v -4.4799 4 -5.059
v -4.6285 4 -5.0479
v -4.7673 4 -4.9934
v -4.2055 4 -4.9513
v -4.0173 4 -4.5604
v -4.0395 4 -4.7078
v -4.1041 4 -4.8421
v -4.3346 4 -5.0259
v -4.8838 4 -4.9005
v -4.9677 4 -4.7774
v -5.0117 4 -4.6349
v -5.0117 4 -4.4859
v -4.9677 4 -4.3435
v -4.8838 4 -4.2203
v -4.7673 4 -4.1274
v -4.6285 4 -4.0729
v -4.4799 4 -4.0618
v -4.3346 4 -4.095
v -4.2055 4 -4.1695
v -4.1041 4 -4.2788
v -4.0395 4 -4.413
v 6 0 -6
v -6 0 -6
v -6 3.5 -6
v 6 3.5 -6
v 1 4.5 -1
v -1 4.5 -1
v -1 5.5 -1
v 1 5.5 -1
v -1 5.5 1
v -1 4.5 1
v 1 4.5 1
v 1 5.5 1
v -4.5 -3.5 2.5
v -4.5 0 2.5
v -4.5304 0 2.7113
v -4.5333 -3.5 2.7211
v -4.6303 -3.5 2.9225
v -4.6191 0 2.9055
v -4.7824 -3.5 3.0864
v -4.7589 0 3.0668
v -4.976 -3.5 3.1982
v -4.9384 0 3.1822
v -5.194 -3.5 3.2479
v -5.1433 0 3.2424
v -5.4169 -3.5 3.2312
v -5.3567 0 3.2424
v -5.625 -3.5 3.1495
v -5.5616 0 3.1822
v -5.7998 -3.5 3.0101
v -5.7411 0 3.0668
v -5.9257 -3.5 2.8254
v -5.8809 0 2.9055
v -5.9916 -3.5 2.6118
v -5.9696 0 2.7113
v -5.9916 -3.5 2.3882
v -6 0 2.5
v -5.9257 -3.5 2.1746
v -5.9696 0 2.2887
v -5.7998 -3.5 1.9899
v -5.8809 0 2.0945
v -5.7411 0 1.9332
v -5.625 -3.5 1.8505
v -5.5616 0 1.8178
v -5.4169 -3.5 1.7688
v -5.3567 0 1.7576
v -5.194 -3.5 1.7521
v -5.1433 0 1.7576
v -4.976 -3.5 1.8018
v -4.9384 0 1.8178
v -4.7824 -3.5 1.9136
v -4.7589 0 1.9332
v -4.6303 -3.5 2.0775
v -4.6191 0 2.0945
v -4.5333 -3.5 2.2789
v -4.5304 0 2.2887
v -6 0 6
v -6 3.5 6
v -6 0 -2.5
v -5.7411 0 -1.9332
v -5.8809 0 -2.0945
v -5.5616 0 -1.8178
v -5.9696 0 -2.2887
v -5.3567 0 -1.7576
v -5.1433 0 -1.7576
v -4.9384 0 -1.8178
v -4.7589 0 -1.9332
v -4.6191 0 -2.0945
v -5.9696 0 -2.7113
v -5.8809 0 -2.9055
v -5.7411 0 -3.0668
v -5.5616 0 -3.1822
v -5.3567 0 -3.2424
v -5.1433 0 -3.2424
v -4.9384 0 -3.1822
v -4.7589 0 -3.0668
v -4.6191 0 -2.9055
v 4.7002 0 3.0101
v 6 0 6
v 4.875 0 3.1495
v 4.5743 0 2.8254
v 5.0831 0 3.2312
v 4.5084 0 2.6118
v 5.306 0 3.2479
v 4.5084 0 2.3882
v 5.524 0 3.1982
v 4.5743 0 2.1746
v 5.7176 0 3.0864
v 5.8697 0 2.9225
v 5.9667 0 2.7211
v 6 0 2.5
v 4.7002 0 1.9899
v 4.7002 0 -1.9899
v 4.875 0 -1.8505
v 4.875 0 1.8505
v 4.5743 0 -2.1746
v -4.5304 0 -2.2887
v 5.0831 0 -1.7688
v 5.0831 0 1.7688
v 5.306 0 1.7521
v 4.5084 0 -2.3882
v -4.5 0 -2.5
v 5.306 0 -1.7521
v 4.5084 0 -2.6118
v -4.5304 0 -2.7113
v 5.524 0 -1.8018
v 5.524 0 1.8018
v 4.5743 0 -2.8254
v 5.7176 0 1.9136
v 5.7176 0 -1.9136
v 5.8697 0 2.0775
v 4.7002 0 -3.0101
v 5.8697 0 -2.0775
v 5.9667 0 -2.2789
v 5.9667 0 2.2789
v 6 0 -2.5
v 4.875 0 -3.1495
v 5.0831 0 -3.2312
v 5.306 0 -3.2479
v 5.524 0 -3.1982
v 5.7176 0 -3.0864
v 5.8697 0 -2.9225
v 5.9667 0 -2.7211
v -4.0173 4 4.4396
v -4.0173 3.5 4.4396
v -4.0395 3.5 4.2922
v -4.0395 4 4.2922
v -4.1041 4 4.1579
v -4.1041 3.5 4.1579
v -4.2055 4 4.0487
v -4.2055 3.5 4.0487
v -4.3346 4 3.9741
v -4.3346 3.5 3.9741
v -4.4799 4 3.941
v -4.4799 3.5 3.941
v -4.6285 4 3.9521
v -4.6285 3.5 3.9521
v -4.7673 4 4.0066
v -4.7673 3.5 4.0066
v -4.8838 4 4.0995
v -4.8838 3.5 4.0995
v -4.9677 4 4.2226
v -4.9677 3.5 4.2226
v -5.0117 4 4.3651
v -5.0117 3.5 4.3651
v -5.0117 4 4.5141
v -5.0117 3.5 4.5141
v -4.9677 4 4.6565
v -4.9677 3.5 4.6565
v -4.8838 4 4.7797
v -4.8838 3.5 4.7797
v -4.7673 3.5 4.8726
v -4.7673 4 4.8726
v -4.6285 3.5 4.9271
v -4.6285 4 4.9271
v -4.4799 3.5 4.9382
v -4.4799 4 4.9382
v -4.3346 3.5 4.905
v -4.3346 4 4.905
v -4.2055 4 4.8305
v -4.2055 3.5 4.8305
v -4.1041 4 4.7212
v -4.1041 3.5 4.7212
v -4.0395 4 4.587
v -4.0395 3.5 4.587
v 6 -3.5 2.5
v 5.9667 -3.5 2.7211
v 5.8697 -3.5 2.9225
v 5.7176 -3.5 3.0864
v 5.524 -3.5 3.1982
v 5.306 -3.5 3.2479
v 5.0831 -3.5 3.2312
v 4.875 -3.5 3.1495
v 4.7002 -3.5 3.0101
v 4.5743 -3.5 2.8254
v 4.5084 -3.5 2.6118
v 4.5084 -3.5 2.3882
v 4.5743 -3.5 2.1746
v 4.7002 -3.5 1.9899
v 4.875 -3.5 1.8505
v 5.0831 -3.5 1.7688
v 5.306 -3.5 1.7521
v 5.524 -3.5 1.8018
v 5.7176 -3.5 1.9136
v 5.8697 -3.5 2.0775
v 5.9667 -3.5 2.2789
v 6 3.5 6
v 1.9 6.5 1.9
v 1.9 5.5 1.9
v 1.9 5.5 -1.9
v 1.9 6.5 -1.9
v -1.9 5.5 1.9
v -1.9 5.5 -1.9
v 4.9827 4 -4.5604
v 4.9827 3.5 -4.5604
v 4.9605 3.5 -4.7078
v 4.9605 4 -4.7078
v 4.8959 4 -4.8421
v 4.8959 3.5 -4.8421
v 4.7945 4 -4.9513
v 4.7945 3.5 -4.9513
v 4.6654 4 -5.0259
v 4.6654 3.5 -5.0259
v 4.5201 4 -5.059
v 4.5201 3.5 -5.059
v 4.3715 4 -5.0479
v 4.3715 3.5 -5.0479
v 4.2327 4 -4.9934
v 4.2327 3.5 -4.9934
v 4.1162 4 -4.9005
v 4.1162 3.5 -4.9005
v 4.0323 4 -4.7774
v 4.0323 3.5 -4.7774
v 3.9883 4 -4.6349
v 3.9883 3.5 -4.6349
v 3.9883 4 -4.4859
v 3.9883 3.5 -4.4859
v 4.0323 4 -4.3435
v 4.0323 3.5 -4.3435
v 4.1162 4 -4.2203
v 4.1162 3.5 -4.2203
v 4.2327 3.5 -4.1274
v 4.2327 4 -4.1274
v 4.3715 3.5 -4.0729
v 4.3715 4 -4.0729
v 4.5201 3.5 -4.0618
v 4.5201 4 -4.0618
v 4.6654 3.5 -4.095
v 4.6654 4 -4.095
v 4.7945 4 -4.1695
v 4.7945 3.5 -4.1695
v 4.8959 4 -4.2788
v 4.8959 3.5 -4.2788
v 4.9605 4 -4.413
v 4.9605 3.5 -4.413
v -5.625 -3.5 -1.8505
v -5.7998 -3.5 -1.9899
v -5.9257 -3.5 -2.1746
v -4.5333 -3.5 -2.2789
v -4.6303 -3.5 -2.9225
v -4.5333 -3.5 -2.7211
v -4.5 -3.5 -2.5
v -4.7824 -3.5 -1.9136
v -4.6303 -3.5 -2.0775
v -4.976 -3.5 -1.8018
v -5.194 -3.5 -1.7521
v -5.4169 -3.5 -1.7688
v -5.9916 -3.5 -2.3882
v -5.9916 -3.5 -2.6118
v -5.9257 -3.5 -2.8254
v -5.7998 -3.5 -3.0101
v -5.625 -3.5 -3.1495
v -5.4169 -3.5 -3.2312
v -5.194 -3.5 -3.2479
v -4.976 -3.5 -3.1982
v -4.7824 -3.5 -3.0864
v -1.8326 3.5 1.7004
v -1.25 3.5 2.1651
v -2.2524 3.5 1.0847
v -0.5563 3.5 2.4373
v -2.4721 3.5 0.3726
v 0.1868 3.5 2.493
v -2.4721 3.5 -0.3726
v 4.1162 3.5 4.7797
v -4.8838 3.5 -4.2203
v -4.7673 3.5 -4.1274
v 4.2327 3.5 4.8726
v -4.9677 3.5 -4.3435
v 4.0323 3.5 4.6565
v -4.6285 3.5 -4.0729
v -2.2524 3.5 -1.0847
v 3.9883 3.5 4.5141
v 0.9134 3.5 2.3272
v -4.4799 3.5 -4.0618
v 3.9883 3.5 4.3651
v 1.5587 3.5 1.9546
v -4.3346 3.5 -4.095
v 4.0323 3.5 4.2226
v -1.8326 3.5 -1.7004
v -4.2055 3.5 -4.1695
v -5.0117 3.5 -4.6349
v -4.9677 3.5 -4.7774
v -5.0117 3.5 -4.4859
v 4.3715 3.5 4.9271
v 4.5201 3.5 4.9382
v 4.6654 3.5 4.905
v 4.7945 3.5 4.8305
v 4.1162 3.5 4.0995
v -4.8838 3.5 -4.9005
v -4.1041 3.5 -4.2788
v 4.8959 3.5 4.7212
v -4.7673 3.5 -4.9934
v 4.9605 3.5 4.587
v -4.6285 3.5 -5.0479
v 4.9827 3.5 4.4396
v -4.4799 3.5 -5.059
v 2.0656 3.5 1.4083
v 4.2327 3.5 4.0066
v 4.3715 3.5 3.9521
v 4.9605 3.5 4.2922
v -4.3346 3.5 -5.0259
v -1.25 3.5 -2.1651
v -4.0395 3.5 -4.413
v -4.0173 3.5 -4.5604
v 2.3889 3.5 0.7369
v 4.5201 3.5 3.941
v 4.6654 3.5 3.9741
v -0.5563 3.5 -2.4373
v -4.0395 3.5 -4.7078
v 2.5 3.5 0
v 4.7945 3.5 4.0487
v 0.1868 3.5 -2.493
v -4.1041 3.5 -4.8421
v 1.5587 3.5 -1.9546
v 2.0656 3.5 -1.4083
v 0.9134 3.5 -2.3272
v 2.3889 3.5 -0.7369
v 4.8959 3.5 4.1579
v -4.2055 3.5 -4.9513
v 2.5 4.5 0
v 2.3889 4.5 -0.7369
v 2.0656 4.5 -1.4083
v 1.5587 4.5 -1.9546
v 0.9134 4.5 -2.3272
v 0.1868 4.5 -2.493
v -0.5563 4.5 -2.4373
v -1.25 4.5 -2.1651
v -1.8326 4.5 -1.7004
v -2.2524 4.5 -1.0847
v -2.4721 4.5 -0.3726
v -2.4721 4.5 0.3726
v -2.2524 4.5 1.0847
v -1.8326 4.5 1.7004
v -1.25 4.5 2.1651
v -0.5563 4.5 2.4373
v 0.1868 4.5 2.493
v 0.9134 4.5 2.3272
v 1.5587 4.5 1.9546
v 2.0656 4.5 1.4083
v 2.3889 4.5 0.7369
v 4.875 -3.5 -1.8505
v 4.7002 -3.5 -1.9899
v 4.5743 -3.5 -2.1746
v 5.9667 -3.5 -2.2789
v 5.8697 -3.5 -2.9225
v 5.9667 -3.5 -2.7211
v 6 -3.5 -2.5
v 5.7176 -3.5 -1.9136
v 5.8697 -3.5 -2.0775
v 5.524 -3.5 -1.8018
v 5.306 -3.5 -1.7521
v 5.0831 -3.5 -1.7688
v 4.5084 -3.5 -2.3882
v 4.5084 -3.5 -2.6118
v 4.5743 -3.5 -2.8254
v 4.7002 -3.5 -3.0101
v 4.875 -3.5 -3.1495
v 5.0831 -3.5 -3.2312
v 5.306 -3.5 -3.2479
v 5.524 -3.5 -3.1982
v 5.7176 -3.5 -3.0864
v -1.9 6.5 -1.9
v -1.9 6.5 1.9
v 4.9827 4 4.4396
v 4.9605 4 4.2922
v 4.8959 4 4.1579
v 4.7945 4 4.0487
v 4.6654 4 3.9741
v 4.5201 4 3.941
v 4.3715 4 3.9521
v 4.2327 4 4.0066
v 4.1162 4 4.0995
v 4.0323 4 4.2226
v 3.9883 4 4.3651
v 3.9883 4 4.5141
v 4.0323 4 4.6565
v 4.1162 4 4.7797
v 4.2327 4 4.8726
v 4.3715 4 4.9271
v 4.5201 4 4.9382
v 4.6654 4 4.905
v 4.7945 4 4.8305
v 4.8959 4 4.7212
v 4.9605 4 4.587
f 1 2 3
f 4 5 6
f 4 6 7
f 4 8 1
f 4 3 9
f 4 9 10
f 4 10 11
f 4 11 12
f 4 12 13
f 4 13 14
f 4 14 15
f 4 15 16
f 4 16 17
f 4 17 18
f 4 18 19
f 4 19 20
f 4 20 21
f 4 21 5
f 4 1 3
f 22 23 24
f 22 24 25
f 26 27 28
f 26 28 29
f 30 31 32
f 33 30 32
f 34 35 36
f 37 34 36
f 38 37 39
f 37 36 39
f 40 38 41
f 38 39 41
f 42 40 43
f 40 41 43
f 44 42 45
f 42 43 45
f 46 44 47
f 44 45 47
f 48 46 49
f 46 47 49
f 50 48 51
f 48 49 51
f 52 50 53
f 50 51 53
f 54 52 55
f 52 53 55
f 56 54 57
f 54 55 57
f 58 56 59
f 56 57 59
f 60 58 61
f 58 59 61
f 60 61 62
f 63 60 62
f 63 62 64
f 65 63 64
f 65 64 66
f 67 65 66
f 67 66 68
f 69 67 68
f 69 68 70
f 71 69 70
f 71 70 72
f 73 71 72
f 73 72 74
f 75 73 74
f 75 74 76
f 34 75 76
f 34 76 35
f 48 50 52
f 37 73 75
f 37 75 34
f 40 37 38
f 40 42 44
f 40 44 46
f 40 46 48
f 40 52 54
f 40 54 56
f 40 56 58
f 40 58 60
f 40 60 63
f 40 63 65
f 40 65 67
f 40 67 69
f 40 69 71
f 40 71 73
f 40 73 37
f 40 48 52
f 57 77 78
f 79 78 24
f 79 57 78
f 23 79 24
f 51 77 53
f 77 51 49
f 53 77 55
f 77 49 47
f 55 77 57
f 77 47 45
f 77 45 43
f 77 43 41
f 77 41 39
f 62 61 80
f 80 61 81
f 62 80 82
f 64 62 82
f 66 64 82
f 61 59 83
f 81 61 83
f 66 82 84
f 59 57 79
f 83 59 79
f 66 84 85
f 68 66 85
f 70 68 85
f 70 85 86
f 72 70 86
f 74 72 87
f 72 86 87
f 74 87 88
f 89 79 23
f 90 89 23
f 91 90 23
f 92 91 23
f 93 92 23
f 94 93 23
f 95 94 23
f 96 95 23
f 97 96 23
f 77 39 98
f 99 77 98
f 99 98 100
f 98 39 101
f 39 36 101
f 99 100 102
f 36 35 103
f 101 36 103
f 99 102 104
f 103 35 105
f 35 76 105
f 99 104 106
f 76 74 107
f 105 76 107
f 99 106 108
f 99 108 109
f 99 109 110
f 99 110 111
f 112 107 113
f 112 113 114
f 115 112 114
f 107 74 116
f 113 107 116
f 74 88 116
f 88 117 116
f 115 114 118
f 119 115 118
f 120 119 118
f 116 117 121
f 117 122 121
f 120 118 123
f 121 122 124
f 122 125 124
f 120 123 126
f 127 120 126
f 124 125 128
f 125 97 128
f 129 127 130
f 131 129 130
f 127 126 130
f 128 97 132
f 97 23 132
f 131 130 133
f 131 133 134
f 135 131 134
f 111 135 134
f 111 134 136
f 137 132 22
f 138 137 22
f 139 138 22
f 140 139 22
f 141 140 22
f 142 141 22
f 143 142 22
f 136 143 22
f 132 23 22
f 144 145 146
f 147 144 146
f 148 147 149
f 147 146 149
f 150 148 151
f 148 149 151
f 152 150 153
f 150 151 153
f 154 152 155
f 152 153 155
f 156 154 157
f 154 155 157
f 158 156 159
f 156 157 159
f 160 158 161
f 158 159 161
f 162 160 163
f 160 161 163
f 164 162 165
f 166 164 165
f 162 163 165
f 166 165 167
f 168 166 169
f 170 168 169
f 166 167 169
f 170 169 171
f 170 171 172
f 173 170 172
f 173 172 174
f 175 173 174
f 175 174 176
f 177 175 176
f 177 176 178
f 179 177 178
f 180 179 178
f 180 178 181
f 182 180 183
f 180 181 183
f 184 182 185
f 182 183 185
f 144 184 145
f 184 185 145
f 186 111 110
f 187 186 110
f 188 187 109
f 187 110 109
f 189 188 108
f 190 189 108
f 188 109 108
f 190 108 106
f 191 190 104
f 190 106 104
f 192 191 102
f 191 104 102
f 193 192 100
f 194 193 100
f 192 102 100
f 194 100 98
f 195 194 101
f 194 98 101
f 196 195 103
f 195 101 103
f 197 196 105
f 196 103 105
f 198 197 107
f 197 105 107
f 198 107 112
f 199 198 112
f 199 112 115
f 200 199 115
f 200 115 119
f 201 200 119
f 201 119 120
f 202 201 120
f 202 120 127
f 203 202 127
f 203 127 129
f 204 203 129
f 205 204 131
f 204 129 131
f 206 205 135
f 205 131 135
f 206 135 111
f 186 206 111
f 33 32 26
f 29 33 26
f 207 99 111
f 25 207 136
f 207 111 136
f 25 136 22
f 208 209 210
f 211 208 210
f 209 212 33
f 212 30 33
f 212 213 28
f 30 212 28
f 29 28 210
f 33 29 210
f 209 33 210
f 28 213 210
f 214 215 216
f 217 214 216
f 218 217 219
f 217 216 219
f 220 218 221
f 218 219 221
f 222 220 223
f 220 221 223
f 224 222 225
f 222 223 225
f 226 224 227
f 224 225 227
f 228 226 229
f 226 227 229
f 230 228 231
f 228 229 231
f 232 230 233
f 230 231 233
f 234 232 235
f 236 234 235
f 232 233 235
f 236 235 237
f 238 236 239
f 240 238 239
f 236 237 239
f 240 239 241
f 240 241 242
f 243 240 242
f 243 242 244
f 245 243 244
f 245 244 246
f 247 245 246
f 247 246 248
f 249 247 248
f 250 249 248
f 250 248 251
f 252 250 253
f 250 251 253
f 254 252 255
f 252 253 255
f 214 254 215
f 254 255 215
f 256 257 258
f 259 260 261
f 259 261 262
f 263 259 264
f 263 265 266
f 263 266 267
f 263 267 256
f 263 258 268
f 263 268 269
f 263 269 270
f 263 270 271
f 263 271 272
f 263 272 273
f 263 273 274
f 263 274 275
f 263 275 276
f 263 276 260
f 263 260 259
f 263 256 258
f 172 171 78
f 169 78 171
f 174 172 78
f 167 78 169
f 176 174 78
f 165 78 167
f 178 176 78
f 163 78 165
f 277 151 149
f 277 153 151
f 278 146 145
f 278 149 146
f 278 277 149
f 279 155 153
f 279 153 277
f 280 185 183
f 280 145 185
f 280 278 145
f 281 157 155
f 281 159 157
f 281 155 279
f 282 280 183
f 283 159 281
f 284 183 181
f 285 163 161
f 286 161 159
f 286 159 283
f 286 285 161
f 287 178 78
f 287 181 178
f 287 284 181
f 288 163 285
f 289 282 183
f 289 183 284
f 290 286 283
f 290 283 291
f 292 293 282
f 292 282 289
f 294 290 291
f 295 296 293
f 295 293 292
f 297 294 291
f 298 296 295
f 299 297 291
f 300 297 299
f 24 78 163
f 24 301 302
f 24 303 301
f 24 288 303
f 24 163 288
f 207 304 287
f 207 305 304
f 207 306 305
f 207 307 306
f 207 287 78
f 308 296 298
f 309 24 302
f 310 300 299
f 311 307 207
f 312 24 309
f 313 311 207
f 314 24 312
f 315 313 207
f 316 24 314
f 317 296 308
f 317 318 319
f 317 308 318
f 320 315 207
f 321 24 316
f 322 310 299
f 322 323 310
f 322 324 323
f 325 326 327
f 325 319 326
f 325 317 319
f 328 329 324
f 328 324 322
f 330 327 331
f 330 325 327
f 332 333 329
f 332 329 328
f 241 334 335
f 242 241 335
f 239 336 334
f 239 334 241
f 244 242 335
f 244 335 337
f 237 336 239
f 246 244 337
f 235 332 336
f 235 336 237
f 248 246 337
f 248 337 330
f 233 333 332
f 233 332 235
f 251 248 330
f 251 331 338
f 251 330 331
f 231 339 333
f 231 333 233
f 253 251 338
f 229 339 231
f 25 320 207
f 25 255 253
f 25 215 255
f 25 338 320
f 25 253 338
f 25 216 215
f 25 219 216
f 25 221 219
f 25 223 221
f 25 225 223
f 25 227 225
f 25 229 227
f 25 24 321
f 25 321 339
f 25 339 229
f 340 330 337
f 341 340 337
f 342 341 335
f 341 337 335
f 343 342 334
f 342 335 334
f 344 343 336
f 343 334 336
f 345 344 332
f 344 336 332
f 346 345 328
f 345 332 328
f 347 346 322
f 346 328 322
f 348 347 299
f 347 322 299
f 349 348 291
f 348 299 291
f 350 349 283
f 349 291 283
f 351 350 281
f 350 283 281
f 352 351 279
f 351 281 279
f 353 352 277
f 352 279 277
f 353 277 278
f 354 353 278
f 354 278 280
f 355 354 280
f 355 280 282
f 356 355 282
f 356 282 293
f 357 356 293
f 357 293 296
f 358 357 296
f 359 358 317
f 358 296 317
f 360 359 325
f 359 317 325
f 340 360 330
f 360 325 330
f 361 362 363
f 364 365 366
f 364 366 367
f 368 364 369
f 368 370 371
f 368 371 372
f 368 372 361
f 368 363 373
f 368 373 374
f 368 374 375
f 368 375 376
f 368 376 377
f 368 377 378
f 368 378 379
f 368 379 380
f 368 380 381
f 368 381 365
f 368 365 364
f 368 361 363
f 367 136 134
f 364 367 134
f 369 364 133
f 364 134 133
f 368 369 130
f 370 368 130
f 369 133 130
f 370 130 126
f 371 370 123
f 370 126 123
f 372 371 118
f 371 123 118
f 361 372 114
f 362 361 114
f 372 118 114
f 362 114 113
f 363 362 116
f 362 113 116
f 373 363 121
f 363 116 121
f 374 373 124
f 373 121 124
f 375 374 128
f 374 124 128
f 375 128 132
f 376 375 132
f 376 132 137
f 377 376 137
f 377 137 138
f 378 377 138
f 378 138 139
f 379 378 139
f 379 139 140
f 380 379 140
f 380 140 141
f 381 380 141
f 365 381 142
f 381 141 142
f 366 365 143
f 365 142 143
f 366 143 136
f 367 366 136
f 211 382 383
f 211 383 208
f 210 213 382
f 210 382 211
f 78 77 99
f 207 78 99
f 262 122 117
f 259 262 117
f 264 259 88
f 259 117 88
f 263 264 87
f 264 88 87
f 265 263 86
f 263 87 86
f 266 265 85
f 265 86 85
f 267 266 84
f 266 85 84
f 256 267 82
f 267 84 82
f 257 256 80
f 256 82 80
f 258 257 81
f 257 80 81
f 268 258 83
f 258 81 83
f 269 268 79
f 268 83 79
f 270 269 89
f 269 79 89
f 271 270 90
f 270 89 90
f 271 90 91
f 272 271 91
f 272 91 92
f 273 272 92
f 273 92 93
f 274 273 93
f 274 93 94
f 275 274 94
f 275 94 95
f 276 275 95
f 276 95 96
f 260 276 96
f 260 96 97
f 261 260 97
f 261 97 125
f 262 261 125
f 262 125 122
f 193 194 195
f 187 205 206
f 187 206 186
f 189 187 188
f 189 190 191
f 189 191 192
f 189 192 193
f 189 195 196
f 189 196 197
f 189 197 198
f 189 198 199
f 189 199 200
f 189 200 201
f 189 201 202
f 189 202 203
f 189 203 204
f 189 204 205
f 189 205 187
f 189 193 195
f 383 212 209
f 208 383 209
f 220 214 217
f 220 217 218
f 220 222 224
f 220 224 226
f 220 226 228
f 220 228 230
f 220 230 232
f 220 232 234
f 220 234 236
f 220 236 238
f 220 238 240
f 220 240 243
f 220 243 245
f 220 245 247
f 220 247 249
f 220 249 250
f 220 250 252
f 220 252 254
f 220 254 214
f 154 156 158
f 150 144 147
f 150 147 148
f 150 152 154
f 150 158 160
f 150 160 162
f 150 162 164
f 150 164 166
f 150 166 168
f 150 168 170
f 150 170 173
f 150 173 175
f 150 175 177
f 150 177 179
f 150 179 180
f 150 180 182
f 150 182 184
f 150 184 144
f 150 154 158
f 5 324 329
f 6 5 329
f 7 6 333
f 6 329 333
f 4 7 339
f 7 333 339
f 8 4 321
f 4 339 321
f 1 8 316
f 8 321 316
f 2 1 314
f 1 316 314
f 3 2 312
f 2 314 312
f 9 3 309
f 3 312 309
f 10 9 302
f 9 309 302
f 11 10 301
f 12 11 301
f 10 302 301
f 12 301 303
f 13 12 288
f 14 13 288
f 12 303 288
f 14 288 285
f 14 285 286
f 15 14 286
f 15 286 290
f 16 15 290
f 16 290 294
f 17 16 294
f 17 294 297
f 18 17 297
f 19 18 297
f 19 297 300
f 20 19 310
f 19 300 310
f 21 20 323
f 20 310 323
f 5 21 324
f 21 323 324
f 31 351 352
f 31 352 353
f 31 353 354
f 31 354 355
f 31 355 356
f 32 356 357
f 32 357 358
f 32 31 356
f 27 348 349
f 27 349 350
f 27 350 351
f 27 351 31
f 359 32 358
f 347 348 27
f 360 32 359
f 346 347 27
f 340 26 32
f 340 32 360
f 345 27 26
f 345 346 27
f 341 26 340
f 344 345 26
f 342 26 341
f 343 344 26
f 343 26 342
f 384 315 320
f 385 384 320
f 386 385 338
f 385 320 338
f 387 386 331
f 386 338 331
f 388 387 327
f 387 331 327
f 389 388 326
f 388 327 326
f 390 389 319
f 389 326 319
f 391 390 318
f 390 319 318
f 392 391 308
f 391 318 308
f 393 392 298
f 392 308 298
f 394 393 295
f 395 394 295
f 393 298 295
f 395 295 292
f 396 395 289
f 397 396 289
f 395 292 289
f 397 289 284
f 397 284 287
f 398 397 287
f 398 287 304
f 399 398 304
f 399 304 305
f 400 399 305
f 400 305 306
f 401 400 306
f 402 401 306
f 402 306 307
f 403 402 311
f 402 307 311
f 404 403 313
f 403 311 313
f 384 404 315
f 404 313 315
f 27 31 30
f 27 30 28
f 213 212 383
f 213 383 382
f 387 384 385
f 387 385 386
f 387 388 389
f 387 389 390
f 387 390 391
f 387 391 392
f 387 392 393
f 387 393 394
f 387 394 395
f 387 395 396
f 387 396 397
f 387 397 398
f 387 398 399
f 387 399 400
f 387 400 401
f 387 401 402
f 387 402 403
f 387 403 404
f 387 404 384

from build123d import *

# Parameters (mm, degrees)
SKETCH1_W           = 12
SKETCH1_H           = 12
BOSS_EXTRUDE1_DEPTH = 3.5
SKETCH2_R           = 2.5
BOSS_EXTRUDE2_DEPTH = 1
SKETCH3_R           = 0.5
BOSS_EXTRUDE3_DEPTH = 0.5
SKETCH4_W           = 2
SKETCH4_H           = 2
BOSS_EXTRUDE4_DEPTH = 1
SKETCH5_W           = 3.8
SKETCH5_H           = 3.8
BOSS_EXTRUDE5_DEPTH = 1
SKETCH6_R           = 0.75
BOSS_EXTRUDE6_DEPTH = 3.5


with BuildPart() as part:
    # Sketch1 → Boss-Extrude1 (new body)
    with BuildSketch(Plane(origin=(0, 0, 0), x_dir=(1, 0, 0), z_dir=(0, 1, 0))):
        Rectangle(SKETCH1_W, SKETCH1_H)
    extrude(amount=BOSS_EXTRUDE1_DEPTH)

    # Sketch2 → Boss-Extrude2 (add)
    with BuildSketch(Plane(origin=(0, 3.5, 0), x_dir=(1, 0, 0), z_dir=(0, 1, 0))):
        Circle(SKETCH2_R)
    extrude(amount=BOSS_EXTRUDE2_DEPTH)

    # Sketch3 → Boss-Extrude3 (add)
    with BuildSketch(Plane(origin=(0, 3.5, 0), x_dir=(1, 0, 0), z_dir=(0, 1, 0))):
        with Locations((-4.51726096, 4.56041336)):
            Circle(SKETCH3_R)
        with Locations((-4.51726096, -4.43958664)):
            Circle(SKETCH3_R)
        with Locations((4.48273904, -4.43958664)):
            Circle(SKETCH3_R)
        with Locations((4.48273904, 4.56041336)):
            Circle(SKETCH3_R)
    extrude(amount=BOSS_EXTRUDE3_DEPTH)

    # Sketch4 → Boss-Extrude4 (add)
    with BuildSketch(Plane(origin=(0, 4.5, 0), x_dir=(1, 0, 0), z_dir=(0, 1, 0))):
        Rectangle(SKETCH4_W, SKETCH4_H)
    extrude(amount=BOSS_EXTRUDE4_DEPTH)

    # Sketch5 → Boss-Extrude5 (add)
    with BuildSketch(Plane(origin=(0, 5.5, 0), x_dir=(1, 0, 0), z_dir=(0, 1, 0))):
        Rectangle(SKETCH5_W, SKETCH5_H)
    extrude(amount=BOSS_EXTRUDE5_DEPTH)

    # Sketch6 → Boss-Extrude6 (add)
    with BuildSketch(Plane.XZ):
        with Locations((-5.25, 2.5)):
            Circle(SKETCH6_R)
        with Locations((-5.25, -2.5)):
            Circle(SKETCH6_R)
        with Locations((5.25, -2.5)):
            Circle(SKETCH6_R)
        with Locations((5.25, 2.5)):
            Circle(SKETCH6_R)
    extrude(amount=BOSS_EXTRUDE6_DEPTH)


solid = part.part
